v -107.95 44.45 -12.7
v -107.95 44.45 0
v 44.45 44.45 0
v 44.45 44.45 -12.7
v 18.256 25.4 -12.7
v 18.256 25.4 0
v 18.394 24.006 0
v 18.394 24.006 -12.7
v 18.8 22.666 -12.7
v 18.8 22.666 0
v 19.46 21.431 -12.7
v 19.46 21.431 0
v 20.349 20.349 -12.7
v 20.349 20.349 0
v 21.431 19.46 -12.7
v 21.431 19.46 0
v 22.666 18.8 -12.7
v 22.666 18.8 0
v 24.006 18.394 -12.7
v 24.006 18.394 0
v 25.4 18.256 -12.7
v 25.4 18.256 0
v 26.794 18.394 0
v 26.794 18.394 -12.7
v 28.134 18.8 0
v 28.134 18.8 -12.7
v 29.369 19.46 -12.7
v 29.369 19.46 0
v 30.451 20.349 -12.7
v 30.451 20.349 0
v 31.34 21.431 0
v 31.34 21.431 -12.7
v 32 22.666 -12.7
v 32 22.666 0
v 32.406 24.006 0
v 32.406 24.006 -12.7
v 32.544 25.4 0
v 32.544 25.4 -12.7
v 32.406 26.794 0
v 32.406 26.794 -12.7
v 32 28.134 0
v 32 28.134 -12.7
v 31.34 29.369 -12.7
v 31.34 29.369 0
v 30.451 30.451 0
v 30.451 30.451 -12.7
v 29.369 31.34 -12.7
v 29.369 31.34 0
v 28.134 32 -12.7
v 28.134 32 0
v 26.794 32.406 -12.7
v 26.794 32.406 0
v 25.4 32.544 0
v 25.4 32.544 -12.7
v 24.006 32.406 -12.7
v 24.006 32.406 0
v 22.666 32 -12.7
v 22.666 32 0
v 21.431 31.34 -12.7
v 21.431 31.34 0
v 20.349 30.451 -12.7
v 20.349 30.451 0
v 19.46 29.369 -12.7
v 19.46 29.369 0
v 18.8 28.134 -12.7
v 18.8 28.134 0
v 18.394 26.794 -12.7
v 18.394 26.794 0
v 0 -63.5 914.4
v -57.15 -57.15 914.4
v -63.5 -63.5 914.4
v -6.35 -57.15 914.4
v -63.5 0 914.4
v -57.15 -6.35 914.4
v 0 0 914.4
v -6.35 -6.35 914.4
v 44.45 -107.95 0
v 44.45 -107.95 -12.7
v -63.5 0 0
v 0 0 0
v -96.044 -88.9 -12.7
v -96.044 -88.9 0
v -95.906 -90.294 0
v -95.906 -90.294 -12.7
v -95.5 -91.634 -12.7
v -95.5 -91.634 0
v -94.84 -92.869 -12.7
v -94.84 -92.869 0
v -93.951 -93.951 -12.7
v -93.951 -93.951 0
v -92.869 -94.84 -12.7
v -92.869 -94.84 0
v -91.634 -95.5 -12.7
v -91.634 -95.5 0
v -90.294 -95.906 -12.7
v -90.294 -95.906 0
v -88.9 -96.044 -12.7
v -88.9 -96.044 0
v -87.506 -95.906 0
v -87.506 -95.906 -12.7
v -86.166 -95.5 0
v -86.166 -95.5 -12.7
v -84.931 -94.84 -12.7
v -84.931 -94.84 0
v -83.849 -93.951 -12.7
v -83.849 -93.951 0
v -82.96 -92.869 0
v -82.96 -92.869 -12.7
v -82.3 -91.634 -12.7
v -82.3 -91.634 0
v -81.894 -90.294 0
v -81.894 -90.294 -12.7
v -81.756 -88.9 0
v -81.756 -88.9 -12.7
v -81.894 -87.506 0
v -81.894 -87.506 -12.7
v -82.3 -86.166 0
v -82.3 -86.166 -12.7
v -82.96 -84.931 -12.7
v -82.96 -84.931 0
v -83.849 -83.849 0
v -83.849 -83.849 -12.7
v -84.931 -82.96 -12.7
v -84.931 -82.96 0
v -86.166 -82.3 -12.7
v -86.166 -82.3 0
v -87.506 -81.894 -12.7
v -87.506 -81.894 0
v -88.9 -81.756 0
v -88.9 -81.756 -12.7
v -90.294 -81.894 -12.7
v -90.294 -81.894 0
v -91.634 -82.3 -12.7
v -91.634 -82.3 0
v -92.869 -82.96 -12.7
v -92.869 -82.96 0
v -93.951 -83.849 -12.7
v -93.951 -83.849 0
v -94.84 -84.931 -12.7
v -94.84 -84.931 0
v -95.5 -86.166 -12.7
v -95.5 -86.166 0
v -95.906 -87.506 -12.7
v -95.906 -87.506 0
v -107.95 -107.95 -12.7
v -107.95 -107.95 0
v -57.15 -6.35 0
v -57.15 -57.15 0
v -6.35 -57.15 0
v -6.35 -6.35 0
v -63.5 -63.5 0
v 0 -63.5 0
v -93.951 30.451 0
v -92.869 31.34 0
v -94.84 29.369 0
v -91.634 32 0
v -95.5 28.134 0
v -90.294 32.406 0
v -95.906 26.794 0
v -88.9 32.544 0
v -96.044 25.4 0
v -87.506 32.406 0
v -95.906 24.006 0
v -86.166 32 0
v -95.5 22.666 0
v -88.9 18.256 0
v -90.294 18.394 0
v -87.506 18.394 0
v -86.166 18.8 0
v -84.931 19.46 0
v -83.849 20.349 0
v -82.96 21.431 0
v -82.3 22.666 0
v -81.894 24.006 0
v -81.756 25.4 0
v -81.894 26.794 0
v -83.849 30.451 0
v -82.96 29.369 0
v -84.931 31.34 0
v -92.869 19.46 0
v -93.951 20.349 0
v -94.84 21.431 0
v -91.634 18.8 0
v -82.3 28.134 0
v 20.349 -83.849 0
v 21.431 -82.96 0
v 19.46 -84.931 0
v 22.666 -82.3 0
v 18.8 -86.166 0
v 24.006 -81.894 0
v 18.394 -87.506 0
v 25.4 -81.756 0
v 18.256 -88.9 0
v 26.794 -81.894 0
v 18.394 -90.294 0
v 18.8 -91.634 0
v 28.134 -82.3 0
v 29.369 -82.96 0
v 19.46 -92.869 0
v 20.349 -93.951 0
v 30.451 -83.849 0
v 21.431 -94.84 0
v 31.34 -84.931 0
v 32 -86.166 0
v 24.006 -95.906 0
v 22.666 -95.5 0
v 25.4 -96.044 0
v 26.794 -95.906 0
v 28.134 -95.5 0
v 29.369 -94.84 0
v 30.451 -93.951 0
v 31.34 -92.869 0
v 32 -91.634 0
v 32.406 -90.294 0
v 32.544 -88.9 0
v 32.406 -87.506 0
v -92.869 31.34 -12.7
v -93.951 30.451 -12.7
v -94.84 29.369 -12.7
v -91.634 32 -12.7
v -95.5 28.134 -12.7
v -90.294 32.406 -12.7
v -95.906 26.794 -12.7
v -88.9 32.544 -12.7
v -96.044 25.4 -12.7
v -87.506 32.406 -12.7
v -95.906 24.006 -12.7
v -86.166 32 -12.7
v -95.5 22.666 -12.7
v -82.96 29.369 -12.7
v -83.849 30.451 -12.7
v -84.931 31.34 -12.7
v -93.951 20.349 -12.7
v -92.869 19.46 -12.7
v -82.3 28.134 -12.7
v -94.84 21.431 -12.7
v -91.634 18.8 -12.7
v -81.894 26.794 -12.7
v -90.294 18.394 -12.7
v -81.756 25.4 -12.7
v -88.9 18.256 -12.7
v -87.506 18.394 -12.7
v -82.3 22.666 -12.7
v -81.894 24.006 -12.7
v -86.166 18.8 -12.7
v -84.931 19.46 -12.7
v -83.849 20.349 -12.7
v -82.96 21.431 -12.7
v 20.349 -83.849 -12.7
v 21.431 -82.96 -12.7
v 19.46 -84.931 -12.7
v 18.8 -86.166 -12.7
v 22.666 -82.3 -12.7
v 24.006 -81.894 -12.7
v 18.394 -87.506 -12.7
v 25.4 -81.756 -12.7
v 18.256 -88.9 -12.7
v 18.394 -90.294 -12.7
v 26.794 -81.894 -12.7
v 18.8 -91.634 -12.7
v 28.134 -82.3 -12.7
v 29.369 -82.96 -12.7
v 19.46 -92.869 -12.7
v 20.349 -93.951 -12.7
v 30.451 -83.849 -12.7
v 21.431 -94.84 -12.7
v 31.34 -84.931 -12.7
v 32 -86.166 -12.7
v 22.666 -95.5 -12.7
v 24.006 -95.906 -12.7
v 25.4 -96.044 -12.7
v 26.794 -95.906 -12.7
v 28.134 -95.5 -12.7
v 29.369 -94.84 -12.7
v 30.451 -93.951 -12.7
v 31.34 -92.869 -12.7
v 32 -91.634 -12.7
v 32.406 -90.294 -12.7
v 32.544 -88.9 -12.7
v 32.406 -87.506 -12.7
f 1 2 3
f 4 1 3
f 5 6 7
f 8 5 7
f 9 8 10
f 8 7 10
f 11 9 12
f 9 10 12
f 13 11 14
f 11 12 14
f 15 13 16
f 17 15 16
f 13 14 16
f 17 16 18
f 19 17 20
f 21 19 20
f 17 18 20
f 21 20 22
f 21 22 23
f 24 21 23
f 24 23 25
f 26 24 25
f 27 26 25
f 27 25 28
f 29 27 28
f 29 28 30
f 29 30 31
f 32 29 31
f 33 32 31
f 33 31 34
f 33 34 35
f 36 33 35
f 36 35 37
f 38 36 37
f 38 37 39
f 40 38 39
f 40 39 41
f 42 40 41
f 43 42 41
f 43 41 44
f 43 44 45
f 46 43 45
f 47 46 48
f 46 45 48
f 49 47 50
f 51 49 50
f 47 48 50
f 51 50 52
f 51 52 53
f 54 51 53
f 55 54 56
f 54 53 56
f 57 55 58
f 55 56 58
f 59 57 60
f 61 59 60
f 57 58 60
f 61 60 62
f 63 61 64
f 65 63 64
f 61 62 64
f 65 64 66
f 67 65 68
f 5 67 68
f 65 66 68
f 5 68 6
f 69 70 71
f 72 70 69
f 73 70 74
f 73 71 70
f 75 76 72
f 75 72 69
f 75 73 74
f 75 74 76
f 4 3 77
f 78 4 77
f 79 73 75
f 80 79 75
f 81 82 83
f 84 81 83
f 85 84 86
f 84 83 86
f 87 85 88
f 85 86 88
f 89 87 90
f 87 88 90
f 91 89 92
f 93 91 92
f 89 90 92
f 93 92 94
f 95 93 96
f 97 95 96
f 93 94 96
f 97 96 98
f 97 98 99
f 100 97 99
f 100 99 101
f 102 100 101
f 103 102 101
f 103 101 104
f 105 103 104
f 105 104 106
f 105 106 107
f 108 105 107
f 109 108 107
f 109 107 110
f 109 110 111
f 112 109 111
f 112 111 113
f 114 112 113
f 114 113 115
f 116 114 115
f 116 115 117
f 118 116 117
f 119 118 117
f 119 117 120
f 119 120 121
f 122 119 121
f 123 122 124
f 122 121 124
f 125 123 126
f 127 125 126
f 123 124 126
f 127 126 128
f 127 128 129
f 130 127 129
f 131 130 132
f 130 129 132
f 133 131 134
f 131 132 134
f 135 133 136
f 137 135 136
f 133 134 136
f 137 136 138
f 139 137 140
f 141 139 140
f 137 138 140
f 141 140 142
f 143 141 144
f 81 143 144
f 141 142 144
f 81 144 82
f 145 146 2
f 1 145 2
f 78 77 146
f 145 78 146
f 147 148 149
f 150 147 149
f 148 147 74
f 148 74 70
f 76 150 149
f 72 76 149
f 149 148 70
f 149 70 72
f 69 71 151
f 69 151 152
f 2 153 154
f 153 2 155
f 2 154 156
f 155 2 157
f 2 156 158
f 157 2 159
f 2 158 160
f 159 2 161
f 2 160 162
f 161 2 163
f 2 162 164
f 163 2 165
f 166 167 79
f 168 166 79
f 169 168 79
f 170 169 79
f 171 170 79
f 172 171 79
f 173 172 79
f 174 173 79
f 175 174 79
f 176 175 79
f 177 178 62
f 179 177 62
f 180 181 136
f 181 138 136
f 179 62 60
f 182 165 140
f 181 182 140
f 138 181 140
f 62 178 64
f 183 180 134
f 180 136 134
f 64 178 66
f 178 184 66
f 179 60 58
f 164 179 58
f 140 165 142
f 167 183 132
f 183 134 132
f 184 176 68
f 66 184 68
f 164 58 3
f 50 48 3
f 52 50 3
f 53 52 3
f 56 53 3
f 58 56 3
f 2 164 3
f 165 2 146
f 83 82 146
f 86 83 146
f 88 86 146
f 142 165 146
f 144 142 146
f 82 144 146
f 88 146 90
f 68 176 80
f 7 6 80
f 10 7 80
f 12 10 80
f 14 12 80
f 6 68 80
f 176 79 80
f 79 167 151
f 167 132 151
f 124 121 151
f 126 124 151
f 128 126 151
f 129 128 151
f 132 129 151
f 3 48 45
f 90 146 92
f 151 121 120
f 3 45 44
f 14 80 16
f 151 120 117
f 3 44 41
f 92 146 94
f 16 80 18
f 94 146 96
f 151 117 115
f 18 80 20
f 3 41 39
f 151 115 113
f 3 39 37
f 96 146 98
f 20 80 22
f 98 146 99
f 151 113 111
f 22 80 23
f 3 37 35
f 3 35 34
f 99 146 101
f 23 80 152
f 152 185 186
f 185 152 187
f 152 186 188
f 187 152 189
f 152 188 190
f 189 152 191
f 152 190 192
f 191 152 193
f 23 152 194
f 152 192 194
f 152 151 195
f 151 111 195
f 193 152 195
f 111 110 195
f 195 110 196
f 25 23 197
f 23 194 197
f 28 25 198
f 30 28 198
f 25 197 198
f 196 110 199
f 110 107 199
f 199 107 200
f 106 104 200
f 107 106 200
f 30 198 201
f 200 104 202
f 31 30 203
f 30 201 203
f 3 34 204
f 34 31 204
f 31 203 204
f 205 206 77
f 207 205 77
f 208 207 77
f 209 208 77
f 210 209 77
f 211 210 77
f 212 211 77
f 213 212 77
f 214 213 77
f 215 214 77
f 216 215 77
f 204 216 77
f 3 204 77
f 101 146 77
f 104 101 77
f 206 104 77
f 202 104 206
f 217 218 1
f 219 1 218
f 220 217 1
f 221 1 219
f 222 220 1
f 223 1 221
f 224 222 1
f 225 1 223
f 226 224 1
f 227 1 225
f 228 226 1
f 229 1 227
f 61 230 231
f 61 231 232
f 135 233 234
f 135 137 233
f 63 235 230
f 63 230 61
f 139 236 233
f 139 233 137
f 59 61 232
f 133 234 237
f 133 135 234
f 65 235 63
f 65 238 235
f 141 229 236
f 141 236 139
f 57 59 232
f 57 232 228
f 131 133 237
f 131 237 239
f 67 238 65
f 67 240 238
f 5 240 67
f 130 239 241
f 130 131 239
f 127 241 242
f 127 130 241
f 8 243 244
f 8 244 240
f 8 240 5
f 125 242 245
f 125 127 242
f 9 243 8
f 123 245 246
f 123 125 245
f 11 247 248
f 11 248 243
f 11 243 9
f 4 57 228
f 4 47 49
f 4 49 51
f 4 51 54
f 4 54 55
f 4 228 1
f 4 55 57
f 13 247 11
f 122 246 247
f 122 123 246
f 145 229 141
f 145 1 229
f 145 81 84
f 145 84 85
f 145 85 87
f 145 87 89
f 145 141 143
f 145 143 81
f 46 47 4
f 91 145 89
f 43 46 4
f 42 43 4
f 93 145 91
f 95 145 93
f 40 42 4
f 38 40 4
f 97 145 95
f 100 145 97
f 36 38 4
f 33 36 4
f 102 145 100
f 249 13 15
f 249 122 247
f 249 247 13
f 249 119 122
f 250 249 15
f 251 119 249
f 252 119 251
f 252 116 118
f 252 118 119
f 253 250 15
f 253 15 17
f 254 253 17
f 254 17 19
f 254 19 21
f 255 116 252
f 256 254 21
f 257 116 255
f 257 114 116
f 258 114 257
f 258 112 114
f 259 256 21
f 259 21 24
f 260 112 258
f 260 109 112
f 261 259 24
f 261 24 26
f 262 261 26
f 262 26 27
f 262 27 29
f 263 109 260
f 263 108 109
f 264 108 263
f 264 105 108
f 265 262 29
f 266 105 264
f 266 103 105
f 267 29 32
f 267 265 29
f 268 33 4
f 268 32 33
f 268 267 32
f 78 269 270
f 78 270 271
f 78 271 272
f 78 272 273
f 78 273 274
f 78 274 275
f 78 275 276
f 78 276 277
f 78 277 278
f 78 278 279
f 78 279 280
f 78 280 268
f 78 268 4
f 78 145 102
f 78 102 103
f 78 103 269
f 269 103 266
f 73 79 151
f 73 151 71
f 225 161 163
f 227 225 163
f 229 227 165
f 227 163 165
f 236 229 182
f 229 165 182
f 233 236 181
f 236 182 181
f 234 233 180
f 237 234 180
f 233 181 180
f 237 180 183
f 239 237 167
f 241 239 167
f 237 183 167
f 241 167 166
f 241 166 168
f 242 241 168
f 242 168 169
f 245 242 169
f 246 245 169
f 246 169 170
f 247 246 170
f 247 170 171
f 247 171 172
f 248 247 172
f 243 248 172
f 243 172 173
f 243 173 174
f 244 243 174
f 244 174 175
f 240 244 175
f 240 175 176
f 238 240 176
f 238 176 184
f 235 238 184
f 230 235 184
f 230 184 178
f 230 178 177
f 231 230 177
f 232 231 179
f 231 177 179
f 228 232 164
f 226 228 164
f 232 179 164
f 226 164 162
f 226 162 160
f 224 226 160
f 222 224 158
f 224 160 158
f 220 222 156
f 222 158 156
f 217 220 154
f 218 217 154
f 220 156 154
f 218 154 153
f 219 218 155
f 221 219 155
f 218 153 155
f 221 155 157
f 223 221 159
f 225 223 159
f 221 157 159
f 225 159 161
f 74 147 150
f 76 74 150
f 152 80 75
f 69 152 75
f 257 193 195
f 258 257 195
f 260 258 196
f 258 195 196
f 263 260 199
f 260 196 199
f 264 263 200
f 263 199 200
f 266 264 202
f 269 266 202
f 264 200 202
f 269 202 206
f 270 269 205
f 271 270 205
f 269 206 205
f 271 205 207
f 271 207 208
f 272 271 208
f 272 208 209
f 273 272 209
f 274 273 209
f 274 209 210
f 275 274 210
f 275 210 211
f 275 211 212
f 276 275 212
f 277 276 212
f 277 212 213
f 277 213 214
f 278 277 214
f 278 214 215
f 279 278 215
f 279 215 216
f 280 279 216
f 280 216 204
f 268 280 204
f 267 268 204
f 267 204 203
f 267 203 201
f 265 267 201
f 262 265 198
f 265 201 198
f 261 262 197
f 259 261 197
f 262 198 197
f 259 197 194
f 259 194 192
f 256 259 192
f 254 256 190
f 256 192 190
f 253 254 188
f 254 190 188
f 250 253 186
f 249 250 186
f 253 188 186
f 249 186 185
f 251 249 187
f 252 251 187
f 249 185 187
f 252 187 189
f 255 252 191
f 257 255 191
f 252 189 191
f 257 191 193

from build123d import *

# Parameters (mm, degrees)
F0_W     = 63.5
F0_H     = 914.4
F1_DEPTH = 63.5
F2_W     = 50.8
F2_H     = 50.8
F3_DEPTH = 914.401
F5_DEPTH = 12.7
F7_DEPTH = 25.4


with BuildPart() as f1:
    # F0 (on Front) → F1 (new body)
    with BuildSketch(Plane.XZ):
        with Locations((-31.75, 457.2)):
            Rectangle(F0_W, F0_H)
    extrude(amount=F1_DEPTH)

    # F2 (on face) → F3 (cut, through all)
    with BuildSketch(Plane(origin=(0, 0, 0), x_dir=(1, 0, 0), z_dir=(0, 0, -1))):
        with Locations((-31.75, 31.75)):
            Rectangle(F2_W, F2_H)
    extrude(amount=-F3_DEPTH, mode=Mode.SUBTRACT)

    # F4 (on face) → F5 (join)
    with BuildSketch(Plane(origin=(0, 0, 0), x_dir=(1, 0, 0), z_dir=(0, 0, -1))):
        Polygon((44.45, 107.95), (-63.5, 107.95), (-107.95, 107.95), (-107.95, -44.45), (44.45, -44.45), align=None)
    extrude(amount=F5_DEPTH)

    # F6 (on face) → F7 (cut)
    with BuildSketch(Plane.XY):
        with BuildLine():
            ThreePointArc((-81.75625, 25.4), (-88.9, 32.54375), (-96.04375, 25.4))
            Line((-96.04375, 25.4), (-81.75625, 25.4))
        make_face()
        with BuildLine():
            ThreePointArc((32.54375, 25.4), (25.4, 32.54375), (18.25625, 25.4))
            ThreePointArc((18.25625, 25.4), (25.4, 18.25625), (32.54375, 25.4))
        make_face()
        with BuildLine():
            Line((-81.75625, 25.4), (-96.04375, 25.4))
            ThreePointArc((-96.04375, 25.4), (-88.9, 18.25625), (-81.75625, 25.4))
        make_face()
        with BuildLine():
            ThreePointArc((-81.75625, -88.9), (-88.9, -81.75625), (-96.04375, -88.9))
            Line((-96.04375, -88.9), (-81.75625, -88.9))
        make_face()
        with BuildLine():
            ThreePointArc((32.54375, -88.9), (25.4, -81.75625), (18.25625, -88.9))
            Line((18.25625, -88.9), (32.54375, -88.9))
        make_face()
        with BuildLine():
            Line((32.54375, -88.9), (18.25625, -88.9))
            ThreePointArc((18.25625, -88.9), (25.4, -96.04375), (32.54375, -88.9))
        make_face()
        with BuildLine():
            Line((-81.75625, -88.9), (-96.04375, -88.9))
            ThreePointArc((-96.04375, -88.9), (-88.9, -96.04375), (-81.75625, -88.9))
        make_face()
    extrude(amount=-F7_DEPTH, mode=Mode.SUBTRACT)


solid = f1.part
